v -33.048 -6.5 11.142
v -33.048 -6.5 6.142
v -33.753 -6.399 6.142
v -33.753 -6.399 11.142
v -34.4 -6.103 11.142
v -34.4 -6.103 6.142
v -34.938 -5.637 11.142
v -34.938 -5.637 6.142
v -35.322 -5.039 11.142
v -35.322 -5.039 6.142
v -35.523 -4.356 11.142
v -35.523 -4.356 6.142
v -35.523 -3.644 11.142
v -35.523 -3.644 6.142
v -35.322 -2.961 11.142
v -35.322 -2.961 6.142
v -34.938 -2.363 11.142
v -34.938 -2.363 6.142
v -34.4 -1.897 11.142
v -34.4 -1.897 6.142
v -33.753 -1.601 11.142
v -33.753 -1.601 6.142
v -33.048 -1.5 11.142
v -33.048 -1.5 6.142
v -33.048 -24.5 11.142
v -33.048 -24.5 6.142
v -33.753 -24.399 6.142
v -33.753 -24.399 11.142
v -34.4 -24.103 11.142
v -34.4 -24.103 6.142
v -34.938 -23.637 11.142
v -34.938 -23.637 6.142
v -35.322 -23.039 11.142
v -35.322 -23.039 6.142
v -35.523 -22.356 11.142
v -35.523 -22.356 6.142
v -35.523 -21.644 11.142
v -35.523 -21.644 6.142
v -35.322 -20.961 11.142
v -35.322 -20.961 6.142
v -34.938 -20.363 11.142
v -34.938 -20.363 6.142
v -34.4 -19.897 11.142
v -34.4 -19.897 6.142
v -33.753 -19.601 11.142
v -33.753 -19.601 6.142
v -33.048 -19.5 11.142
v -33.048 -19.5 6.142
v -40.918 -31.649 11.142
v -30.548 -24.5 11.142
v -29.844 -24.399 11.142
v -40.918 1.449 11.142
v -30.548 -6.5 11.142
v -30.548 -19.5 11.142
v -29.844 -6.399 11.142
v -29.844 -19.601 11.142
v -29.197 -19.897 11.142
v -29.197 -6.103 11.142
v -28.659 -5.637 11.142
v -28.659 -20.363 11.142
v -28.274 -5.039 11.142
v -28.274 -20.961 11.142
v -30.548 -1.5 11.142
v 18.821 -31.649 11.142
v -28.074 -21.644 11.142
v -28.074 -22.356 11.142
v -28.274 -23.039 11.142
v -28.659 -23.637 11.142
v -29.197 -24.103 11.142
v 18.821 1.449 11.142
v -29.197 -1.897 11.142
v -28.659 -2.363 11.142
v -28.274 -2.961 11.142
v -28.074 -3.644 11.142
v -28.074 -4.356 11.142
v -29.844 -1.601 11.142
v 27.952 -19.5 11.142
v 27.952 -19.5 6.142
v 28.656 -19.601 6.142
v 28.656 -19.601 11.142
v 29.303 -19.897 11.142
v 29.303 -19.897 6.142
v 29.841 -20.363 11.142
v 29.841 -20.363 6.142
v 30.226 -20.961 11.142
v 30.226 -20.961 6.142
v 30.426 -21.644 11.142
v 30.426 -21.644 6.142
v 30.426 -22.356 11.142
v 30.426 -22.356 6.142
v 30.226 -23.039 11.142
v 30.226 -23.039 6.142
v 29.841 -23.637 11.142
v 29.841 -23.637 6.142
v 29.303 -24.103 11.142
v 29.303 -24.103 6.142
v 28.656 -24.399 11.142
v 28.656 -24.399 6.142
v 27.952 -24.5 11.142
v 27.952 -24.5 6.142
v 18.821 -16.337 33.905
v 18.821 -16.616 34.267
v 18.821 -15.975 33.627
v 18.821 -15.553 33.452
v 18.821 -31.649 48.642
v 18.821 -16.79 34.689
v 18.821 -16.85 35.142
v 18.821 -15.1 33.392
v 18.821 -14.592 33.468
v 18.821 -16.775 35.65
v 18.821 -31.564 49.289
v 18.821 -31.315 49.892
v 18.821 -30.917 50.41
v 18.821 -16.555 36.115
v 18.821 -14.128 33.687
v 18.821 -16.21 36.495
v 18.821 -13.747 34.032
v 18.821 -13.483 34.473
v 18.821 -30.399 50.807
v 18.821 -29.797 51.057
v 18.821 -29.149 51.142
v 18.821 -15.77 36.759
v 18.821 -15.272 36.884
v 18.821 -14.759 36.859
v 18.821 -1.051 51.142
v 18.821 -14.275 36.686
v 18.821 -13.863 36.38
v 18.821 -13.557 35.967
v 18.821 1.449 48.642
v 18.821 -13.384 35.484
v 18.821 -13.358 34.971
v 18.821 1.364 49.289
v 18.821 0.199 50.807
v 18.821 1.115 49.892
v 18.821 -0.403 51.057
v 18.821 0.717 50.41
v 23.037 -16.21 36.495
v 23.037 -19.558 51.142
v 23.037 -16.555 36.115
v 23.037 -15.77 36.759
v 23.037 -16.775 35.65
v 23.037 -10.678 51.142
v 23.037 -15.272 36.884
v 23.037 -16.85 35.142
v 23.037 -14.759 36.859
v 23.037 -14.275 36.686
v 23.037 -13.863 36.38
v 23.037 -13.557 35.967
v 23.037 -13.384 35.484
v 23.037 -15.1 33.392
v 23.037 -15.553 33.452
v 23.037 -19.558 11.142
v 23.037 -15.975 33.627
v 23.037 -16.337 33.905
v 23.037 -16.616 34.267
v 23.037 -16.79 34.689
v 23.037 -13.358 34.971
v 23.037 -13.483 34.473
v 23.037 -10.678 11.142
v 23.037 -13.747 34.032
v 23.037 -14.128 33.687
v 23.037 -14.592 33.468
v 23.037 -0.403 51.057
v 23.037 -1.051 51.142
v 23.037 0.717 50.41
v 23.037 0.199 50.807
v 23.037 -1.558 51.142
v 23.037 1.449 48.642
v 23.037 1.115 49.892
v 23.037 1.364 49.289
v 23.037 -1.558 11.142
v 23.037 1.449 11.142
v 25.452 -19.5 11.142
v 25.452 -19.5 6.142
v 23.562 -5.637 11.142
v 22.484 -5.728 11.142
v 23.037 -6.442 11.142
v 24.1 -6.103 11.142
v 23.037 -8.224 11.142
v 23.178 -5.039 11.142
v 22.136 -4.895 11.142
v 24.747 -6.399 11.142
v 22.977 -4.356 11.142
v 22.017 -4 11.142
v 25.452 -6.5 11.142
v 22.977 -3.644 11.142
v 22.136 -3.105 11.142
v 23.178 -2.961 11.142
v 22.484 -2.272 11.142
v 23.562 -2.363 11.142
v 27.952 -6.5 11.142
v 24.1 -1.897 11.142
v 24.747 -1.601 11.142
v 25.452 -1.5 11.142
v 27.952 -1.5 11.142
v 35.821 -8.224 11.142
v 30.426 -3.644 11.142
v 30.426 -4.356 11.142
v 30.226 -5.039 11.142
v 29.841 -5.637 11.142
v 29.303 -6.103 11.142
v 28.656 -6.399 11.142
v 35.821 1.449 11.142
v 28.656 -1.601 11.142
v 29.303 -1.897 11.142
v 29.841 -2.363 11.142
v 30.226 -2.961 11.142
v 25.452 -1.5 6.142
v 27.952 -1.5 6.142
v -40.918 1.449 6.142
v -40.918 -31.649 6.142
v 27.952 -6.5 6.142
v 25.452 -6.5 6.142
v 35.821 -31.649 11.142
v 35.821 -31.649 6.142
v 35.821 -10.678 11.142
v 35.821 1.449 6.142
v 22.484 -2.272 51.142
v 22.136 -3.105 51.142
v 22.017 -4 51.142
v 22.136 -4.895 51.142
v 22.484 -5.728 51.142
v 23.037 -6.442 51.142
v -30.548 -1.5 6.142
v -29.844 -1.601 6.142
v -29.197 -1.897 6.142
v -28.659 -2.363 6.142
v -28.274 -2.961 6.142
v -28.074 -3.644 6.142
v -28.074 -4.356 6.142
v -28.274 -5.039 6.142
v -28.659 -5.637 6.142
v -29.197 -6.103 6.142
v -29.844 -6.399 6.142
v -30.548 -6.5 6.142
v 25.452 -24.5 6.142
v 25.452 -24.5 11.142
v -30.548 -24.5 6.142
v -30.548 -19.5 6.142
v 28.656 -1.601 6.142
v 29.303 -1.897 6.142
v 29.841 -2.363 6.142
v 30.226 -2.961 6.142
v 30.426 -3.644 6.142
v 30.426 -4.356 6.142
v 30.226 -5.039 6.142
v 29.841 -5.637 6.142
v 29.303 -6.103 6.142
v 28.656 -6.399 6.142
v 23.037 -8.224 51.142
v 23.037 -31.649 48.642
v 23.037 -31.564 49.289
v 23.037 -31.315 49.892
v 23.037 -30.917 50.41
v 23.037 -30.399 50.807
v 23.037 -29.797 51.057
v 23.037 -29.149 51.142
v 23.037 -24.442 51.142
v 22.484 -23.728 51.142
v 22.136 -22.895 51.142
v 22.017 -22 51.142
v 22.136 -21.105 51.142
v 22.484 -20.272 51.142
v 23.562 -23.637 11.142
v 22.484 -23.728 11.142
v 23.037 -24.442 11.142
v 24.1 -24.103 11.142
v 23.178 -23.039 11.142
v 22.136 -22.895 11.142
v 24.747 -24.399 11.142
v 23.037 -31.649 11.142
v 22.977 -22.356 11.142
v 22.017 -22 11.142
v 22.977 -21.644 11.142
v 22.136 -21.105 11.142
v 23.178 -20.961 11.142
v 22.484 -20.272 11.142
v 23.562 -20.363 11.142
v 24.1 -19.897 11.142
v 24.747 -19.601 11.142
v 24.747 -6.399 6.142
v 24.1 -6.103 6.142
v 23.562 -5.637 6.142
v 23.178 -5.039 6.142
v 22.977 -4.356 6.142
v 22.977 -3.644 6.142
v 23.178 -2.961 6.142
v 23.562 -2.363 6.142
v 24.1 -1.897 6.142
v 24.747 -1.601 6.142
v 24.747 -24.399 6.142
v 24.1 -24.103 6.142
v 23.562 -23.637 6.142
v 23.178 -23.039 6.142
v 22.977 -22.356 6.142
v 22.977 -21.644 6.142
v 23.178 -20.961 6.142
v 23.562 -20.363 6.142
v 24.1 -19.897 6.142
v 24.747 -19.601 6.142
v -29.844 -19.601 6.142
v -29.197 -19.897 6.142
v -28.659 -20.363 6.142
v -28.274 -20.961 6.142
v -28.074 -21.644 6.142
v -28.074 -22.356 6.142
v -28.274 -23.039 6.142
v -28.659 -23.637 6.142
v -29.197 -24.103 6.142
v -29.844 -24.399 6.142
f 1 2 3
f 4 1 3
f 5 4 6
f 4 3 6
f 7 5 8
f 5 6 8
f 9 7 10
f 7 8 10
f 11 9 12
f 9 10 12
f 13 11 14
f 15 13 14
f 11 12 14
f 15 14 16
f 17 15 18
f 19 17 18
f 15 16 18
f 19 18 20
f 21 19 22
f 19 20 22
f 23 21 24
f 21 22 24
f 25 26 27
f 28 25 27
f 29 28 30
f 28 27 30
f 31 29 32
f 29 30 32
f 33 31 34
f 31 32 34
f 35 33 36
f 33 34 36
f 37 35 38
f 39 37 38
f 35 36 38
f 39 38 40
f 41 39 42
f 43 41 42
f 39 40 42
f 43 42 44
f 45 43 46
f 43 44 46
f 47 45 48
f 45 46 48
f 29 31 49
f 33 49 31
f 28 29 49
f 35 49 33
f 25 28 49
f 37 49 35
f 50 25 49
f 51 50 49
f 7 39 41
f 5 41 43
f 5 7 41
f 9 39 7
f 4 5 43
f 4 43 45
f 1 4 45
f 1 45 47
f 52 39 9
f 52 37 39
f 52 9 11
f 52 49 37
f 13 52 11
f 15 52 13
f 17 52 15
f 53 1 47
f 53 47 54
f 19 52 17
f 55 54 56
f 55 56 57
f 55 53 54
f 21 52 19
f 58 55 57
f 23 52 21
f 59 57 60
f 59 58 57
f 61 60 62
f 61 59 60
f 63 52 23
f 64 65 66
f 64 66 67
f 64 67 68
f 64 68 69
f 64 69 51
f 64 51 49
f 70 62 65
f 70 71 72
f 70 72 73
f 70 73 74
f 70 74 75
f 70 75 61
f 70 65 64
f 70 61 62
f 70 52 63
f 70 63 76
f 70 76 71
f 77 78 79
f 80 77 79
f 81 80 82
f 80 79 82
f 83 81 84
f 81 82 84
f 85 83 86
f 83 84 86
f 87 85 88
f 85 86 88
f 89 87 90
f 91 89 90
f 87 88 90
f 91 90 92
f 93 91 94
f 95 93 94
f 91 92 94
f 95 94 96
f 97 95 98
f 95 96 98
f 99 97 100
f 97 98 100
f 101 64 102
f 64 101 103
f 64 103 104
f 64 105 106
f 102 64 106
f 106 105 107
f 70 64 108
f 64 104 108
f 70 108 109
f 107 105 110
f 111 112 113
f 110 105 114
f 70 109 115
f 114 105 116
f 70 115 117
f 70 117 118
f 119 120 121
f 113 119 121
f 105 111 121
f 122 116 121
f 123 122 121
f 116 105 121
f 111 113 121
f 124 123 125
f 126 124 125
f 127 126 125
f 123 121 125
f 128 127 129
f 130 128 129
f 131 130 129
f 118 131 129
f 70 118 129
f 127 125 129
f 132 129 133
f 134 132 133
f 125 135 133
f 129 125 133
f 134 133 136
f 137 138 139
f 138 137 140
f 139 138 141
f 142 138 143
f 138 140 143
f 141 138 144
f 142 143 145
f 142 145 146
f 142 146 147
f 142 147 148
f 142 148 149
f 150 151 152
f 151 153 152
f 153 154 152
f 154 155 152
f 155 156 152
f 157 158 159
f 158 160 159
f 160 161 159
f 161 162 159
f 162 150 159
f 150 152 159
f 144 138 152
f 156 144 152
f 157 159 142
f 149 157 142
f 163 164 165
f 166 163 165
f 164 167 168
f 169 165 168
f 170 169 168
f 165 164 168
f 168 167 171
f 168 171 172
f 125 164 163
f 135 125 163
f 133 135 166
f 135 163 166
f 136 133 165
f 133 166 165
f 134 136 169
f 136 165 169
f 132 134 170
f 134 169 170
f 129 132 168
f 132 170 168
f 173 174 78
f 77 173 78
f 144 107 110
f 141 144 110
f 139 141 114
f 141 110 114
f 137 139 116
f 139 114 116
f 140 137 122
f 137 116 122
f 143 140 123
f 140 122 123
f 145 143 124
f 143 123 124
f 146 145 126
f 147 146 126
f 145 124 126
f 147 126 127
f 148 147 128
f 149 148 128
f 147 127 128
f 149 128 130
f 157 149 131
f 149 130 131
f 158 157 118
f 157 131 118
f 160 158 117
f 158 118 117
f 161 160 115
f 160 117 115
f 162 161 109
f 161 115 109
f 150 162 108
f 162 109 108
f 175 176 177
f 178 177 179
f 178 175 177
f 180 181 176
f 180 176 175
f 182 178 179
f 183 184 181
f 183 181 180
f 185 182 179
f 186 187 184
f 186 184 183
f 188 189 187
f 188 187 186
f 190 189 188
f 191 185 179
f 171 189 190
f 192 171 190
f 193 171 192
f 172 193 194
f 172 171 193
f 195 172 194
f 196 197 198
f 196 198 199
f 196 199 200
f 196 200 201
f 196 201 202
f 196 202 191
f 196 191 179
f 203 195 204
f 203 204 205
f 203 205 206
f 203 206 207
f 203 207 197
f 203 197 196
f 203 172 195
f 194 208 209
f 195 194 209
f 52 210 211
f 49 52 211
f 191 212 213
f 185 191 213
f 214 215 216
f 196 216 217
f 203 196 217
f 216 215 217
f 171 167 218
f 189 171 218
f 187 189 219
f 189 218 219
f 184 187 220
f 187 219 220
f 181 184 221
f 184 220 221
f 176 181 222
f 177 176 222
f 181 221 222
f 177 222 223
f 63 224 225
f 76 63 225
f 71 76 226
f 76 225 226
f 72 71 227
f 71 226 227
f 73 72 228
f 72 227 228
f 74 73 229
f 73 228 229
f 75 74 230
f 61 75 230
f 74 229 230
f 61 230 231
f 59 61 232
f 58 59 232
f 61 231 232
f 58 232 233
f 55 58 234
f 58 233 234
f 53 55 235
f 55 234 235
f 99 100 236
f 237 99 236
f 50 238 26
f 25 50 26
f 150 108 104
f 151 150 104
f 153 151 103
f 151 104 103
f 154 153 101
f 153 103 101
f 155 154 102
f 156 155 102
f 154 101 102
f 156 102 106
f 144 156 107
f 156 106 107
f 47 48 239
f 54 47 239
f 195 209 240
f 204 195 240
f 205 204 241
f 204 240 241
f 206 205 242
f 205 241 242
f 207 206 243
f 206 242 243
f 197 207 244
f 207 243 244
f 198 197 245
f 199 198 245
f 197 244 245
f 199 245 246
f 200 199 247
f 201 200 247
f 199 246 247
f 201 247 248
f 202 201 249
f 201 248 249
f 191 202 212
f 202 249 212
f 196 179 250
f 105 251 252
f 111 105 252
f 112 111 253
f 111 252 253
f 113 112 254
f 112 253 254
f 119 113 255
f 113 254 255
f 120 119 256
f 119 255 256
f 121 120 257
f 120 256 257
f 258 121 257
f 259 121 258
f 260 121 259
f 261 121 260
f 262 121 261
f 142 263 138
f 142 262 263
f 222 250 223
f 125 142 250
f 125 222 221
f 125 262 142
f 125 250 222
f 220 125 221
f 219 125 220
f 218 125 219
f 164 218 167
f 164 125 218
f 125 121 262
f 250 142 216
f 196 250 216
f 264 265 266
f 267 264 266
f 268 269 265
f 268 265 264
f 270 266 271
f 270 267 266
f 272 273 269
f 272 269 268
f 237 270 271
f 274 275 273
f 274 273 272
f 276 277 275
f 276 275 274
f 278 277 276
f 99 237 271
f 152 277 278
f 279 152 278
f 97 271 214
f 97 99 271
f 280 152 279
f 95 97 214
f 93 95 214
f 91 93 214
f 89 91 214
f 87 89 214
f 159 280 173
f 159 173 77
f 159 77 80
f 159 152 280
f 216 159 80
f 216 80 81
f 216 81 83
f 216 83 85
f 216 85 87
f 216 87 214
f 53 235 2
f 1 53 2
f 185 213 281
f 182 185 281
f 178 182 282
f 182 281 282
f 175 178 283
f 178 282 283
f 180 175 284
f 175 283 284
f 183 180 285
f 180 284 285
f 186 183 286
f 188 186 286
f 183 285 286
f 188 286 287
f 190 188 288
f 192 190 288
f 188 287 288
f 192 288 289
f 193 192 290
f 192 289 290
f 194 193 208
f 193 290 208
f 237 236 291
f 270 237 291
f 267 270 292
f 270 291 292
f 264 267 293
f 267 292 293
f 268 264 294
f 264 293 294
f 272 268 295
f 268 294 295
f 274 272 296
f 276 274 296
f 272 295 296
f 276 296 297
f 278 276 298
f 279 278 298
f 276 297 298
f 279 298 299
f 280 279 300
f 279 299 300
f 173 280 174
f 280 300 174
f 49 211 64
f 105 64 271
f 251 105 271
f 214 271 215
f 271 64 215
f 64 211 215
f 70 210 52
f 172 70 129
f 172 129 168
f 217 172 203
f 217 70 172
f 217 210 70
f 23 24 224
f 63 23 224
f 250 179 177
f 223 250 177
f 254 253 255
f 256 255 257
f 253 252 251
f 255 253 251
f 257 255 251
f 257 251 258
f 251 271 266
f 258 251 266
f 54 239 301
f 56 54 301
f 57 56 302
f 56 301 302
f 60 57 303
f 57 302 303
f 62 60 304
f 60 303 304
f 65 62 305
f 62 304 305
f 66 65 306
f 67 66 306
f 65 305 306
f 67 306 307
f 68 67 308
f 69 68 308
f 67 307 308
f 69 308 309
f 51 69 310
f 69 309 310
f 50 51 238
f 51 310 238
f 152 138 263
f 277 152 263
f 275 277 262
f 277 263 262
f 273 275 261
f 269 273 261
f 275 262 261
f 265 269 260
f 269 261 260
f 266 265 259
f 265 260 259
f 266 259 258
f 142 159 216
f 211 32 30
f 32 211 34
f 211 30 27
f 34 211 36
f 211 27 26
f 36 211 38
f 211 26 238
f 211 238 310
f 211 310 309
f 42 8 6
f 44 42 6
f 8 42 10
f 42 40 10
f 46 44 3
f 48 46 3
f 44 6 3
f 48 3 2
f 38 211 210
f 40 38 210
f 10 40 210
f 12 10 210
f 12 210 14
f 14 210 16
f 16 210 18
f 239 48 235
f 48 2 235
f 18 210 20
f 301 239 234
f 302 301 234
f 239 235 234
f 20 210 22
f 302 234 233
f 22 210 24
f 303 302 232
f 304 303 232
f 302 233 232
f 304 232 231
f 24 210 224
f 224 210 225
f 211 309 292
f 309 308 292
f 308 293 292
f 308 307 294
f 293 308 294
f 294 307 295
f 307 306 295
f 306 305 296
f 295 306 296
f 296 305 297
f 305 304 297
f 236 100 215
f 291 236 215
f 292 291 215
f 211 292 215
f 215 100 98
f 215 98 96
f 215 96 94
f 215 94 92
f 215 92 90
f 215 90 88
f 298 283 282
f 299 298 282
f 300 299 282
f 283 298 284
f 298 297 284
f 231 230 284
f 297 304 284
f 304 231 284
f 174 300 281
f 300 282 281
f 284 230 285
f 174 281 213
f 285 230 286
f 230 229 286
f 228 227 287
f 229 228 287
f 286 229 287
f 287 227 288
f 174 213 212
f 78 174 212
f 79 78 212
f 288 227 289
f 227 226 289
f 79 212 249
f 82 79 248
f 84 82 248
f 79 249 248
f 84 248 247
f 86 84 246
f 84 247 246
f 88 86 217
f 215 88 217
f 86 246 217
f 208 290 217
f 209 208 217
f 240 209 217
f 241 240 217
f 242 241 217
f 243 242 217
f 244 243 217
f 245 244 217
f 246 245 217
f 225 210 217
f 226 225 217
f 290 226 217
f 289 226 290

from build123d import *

# Parameters (mm, degrees)
F0_W      = 34
F0_H      = 22
F0_R      = 4
F1_DEPTH  = 30.2
F3_DEPTH  = 5
F4_W      = 7.215074
F4_H      = 33.098936
F5_DEPTH  = 40
F7_DEPTH  = 25
F8_R      = 2.5
F9_R      = 3.434689
F10_DEPTH = 40
F14_W     = 3
F14_H     = 33.098936
F15_DEPTH = 40
F16_W     = 12.784926
F16_H     = 2.454489
F17_DEPTH = 40
F19_DEPTH = 25


with BuildPart() as f1:
    # F0 (on Front) → F1 (new body)
    with BuildSketch(Plane.XZ):
        with Locations((-19.066667, -4.857694)):
            Rectangle(F0_W, F0_H)
        with Locations((-19.066667, -4.857694)):
            Circle(F0_R, mode=Mode.SUBTRACT)
        with Locations((17.733333, -4.857694)):
            Rectangle(F0_W, F0_H)
        with Locations((17.733333, -4.857694)):
            Circle(F0_R, mode=Mode.SUBTRACT)
    extrude(amount=F1_DEPTH)


with BuildPart() as f3:
    # F2 (on face) → F3 (new body)
    with BuildSketch(Plane.XY.offset(6.142306)):
        Polygon((-2.548193, 1.449468), (-40.917817, 1.449468), (-40.917817, -31.649468), (35.821432, -31.649468), (35.821432, 1.449468), align=None)
        with BuildLine():
            Line((-30.548193, -24.5), (-33.048193, -24.5))
            ThreePointArc((-33.048193, -24.5), (-35.548193, -22), (-33.048193, -19.5))
            Line((-33.048193, -19.5), (-30.548193, -19.5))
            ThreePointArc((-30.548193, -19.5), (-28.048193, -22), (-30.548193, -24.5))
        make_face(mode=Mode.SUBTRACT)
        with BuildLine():
            ThreePointArc((27.951807, -19.5), (30.451807, -22), (27.951807, -24.5))
            Line((27.951807, -24.5), (25.451807, -24.5))
            ThreePointArc((25.451807, -24.5), (22.951807, -22), (25.451807, -19.5))
            Line((25.451807, -19.5), (27.951807, -19.5))
        make_face(mode=Mode.SUBTRACT)
        with BuildLine():
            Line((-30.548193, -6.5), (-33.048193, -6.5))
            ThreePointArc((-33.048193, -6.5), (-35.548193, -4), (-33.048193, -1.5))
            Line((-33.048193, -1.5), (-30.548193, -1.5))
            ThreePointArc((-30.548193, -1.5), (-28.048193, -4), (-30.548193, -6.5))
        make_face(mode=Mode.SUBTRACT)
        with BuildLine():
            Line((25.451807, -1.5), (27.951807, -1.5))
            ThreePointArc((27.951807, -1.5), (30.451807, -4), (27.951807, -6.5))
            Line((27.951807, -6.5), (25.451807, -6.5))
            ThreePointArc((25.451807, -6.5), (22.951807, -4), (25.451807, -1.5))
        make_face(mode=Mode.SUBTRACT)
    extrude(amount=F3_DEPTH)

    # F4 (on face) → F5 (join)
    with BuildSketch(Plane.XY.offset(11.142306)):
        with Locations((19.428969, -15.1)):
            Rectangle(F4_W, F4_H)
    extrude(amount=F5_DEPTH)

    # F6 (on face) → F7 (cut)
    with BuildSketch(Plane(origin=(15.821432, 0, 0), x_dir=(0, -1, 0), z_dir=(-1, 0, 0))):
        with BuildLine():
            ThreePointArc((15.1, 33.392306), (16.337437, 33.904869), (16.85, 35.142306))
            ThreePointArc((16.85, 35.142306), (13.862563, 36.379742), (15.1, 33.392306))
        make_face()
    extrude(amount=-F7_DEPTH, mode=Mode.SUBTRACT)

    # F8
    f8_edges = [f3.edges().sort_by_distance(p)[0] for p in [
        (19.428969, 1.449468, 51.142306),
        (19.428969, -31.649468, 51.142306),
    ]]
    fillet(f8_edges, radius=F8_R)

    # F9 (on face) → F10 (cut, through all)
    with BuildSketch(Plane.XY.offset(51.142306)):
        with Locations((25.451807, -4)):
            Circle(F9_R)
        with Locations((25.451807, -22)):
            Circle(F9_R)
    extrude(amount=-F10_DEPTH, mode=Mode.SUBTRACT)

    # F14 (on face) → F15 (cut, through all)
    with BuildSketch(Plane.XY.offset(51.142306)):
        with Locations((17.321432, -15.1)):
            Rectangle(F14_W, F14_H)
    extrude(amount=-F15_DEPTH, mode=Mode.SUBTRACT)

    # F16 (on face) → F17 (join, through all)
    with BuildSketch(Plane.XY.offset(11.142306)):
        with Locations((29.428969, -9.451033)):
            Rectangle(F16_W, F16_H)
    extrude(amount=F17_DEPTH)

    # F18 (on face) → F19 (cut)
    with BuildSketch(Plane.XZ.offset(10.678278)):
        Polygon((35.821432, 51.142306), (23.036506, 51.142306), (35.821432, 11.142306), align=None)
    extrude(amount=-F19_DEPTH, mode=Mode.SUBTRACT)


with BuildPart() as f11_1:
    # F11: copy of F3
    add(f3.part)


solid = f3.part
